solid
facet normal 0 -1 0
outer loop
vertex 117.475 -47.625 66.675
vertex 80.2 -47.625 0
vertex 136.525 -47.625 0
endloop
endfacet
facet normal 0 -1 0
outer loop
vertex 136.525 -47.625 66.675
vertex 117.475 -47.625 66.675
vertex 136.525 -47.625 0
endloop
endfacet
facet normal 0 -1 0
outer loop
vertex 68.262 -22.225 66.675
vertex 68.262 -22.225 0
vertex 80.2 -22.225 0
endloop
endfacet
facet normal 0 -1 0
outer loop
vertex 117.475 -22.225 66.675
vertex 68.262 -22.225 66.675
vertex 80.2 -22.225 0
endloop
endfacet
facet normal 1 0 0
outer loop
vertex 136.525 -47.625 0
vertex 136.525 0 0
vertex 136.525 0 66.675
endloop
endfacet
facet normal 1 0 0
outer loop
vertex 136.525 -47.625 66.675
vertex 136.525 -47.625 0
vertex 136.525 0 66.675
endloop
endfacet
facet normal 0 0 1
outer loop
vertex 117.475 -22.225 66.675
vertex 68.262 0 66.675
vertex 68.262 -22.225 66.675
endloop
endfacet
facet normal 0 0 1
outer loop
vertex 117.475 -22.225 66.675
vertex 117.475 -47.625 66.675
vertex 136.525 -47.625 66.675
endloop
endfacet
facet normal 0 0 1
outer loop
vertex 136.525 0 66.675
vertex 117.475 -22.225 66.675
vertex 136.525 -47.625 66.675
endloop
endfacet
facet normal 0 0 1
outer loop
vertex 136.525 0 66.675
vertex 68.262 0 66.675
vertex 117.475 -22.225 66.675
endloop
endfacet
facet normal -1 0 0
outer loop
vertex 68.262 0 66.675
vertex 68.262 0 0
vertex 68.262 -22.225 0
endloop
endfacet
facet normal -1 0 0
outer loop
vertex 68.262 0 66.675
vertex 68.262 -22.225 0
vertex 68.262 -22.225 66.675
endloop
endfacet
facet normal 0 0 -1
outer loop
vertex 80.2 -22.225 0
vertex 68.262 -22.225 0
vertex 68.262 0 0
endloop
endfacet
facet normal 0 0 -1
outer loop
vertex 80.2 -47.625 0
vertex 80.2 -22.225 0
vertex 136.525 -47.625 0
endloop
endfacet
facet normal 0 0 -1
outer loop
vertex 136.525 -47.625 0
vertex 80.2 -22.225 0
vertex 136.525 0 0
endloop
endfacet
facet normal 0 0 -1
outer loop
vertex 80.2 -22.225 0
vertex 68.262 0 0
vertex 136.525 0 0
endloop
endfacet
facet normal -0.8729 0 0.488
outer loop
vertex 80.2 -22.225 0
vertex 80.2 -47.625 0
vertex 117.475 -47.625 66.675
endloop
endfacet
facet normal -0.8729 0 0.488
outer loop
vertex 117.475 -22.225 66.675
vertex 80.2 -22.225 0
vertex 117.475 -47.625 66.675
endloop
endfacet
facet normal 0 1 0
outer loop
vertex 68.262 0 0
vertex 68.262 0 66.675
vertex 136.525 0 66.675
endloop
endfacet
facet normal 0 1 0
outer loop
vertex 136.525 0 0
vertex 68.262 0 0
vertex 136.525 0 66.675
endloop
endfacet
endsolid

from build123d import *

# Parameters (mm, degrees)
F0_W     = 136.525
F0_H     = 66.675
F1_DEPTH = 47.625
F3_DEPTH = 25.4
F4_DEPTH = 68.2625


with BuildPart() as f1:
    # F0 (on Front) → F1 (new body)
    with BuildSketch(Plane.XZ):
        with Locations((68.2625, 33.3375)):
            Rectangle(F0_W, F0_H)
    extrude(amount=F1_DEPTH)

    # F2 (on face) → F3 (cut)
    with BuildSketch(Plane.XZ.offset(47.625)):
        Polygon((117.475, 66.675), (19.05, 66.675), (56.3245, 0), (80.2005, 0), align=None)
    extrude(amount=-F3_DEPTH, mode=Mode.SUBTRACT)

    # F4 (cut): a face of the model
    f4_faces = [f1.faces().sort_by_distance(p)[0] for p in [
        (0, -23.8125, 33.3375),
    ]]
    extrude(f4_faces, amount=-F4_DEPTH, mode=Mode.SUBTRACT)


solid = f1.part
